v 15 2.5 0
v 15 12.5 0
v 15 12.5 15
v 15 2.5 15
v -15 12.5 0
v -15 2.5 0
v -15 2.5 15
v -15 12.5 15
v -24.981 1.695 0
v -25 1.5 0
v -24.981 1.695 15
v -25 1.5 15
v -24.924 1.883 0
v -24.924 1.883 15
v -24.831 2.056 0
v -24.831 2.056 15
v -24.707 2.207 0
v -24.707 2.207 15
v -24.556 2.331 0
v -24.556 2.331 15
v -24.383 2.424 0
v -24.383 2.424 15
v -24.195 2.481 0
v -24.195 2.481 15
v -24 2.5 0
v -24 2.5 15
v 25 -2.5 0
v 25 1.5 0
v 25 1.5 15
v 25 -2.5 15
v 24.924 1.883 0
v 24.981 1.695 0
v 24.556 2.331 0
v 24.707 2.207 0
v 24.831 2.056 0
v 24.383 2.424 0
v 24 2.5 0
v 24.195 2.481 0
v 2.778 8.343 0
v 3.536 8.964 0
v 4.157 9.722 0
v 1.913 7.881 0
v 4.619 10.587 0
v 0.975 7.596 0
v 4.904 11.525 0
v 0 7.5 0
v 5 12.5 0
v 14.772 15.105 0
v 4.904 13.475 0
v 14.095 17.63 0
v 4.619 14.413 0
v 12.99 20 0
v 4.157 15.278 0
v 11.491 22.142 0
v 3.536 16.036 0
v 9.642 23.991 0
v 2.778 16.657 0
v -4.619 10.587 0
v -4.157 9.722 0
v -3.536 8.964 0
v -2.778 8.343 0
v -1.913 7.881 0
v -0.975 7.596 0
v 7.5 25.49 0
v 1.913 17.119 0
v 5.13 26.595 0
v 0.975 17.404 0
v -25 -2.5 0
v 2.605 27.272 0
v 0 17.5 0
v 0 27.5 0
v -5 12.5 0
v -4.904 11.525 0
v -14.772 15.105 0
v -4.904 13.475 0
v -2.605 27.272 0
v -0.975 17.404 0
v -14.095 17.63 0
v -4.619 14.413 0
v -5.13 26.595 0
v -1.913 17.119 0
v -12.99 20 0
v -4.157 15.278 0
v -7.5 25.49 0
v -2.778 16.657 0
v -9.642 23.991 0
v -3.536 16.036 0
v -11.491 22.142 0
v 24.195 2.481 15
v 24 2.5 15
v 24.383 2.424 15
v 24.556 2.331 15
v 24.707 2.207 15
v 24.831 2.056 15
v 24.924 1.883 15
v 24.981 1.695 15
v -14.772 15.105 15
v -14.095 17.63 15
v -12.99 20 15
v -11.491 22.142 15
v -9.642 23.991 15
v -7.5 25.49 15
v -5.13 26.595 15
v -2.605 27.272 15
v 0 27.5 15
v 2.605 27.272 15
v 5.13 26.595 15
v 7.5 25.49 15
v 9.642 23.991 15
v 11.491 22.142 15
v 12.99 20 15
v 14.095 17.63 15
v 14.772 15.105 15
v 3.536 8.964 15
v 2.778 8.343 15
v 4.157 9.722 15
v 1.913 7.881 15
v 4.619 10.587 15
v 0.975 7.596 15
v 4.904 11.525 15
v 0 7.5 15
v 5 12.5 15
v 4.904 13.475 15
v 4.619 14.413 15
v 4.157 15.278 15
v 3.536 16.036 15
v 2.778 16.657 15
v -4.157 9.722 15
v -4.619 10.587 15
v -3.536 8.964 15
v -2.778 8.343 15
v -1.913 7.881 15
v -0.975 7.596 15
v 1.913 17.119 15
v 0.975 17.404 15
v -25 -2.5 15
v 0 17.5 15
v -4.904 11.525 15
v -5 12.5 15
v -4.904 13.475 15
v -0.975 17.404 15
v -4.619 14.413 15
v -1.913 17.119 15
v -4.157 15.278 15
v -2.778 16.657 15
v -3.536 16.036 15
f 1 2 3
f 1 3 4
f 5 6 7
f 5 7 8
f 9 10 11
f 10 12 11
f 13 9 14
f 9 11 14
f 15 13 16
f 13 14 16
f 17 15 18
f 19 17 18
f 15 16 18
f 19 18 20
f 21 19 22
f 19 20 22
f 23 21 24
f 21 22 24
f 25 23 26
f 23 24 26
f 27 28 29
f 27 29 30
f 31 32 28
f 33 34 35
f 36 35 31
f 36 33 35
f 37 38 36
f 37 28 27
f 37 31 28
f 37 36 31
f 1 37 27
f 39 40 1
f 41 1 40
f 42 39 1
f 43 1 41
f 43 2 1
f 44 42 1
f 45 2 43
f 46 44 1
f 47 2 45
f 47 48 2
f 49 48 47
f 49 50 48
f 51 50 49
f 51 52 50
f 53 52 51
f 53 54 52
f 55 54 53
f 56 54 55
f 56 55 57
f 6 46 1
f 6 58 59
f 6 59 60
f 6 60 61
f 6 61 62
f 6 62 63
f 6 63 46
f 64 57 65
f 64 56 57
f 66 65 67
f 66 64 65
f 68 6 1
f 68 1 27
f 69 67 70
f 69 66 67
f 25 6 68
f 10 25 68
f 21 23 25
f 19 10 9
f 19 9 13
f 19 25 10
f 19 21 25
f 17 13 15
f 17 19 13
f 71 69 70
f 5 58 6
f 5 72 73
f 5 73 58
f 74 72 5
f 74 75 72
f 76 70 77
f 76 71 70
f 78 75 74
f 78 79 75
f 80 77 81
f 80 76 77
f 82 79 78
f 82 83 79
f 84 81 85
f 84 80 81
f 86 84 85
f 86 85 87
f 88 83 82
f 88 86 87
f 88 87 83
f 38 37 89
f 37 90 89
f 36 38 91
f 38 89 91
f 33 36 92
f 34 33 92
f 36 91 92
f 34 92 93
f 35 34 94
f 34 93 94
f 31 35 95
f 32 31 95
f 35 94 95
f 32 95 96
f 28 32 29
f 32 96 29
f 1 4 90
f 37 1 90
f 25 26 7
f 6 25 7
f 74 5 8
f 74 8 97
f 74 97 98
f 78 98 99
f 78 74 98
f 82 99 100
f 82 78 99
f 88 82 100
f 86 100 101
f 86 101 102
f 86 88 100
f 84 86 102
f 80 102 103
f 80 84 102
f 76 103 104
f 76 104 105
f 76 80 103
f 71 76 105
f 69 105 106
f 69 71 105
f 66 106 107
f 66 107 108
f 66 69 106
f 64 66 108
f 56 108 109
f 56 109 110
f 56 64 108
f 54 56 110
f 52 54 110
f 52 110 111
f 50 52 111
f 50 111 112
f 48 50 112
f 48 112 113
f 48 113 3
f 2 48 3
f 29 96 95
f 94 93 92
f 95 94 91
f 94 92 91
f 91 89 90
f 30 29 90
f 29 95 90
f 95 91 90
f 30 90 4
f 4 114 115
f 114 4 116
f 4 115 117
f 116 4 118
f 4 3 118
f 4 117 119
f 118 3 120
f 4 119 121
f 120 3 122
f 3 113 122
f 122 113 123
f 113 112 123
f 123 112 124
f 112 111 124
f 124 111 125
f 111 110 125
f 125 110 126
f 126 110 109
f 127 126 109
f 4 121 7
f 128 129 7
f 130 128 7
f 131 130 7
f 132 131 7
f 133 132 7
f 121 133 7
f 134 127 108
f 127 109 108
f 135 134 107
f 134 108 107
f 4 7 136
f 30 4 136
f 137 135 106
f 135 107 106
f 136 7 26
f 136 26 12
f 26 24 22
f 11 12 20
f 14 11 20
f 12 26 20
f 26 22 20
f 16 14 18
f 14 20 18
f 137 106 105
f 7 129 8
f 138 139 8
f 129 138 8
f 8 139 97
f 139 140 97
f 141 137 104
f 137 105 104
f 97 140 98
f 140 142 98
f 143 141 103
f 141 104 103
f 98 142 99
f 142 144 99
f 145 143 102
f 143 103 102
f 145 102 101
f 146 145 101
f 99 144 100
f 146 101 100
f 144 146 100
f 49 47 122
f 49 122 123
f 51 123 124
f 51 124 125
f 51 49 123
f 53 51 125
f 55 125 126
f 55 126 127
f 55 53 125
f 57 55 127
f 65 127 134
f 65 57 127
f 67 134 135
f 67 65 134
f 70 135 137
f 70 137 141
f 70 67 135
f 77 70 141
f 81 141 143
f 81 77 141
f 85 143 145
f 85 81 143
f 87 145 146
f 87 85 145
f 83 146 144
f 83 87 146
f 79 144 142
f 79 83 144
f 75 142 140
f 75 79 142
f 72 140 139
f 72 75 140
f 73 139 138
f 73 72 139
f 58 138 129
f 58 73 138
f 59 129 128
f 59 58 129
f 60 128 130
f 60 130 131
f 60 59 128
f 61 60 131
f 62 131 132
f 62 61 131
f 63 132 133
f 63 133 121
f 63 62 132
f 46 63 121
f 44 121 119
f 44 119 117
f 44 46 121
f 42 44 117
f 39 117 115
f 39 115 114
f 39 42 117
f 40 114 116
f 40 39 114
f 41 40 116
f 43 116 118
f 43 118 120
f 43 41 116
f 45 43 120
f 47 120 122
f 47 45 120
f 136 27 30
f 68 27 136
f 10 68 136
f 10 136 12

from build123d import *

# Parameters (mm, degrees)
SKETCH_1_R      = 5
EXTRUDE_1_DEPTH = 15
FILLET_1_R      = 1


with BuildPart() as part:
    # 草图1 → 凸台-拉伸1 (new body)
    with BuildSketch(Plane.XY):
        with BuildLine():
            Line((15, 2.5), (25, 2.5))
            Line((25, 2.5), (25, -2.5))
            Line((25, -2.5), (-25, -2.5))
            Line((-25, -2.5), (-25, 2.5))
            Line((-25, 2.5), (-15, 2.5))
            Line((-15, 2.5), (-15, 12.5))
            ThreePointArc((-15, 12.5), (0, 27.5), (15, 12.5))
            Line((15, 12.5), (15, 2.5))
        make_face()
        with Locations((0, 12.5)):
            Circle(SKETCH_1_R, mode=Mode.SUBTRACT)
    extrude(amount=EXTRUDE_1_DEPTH)

    # 圆角1
    fillet_1_edges = [part.edges().sort_by_distance(p)[0] for p in [
        (-25, 2.5, 7.5),
        (25, 2.5, 7.5),
    ]]
    fillet(fillet_1_edges, radius=FILLET_1_R)


solid = part.part
